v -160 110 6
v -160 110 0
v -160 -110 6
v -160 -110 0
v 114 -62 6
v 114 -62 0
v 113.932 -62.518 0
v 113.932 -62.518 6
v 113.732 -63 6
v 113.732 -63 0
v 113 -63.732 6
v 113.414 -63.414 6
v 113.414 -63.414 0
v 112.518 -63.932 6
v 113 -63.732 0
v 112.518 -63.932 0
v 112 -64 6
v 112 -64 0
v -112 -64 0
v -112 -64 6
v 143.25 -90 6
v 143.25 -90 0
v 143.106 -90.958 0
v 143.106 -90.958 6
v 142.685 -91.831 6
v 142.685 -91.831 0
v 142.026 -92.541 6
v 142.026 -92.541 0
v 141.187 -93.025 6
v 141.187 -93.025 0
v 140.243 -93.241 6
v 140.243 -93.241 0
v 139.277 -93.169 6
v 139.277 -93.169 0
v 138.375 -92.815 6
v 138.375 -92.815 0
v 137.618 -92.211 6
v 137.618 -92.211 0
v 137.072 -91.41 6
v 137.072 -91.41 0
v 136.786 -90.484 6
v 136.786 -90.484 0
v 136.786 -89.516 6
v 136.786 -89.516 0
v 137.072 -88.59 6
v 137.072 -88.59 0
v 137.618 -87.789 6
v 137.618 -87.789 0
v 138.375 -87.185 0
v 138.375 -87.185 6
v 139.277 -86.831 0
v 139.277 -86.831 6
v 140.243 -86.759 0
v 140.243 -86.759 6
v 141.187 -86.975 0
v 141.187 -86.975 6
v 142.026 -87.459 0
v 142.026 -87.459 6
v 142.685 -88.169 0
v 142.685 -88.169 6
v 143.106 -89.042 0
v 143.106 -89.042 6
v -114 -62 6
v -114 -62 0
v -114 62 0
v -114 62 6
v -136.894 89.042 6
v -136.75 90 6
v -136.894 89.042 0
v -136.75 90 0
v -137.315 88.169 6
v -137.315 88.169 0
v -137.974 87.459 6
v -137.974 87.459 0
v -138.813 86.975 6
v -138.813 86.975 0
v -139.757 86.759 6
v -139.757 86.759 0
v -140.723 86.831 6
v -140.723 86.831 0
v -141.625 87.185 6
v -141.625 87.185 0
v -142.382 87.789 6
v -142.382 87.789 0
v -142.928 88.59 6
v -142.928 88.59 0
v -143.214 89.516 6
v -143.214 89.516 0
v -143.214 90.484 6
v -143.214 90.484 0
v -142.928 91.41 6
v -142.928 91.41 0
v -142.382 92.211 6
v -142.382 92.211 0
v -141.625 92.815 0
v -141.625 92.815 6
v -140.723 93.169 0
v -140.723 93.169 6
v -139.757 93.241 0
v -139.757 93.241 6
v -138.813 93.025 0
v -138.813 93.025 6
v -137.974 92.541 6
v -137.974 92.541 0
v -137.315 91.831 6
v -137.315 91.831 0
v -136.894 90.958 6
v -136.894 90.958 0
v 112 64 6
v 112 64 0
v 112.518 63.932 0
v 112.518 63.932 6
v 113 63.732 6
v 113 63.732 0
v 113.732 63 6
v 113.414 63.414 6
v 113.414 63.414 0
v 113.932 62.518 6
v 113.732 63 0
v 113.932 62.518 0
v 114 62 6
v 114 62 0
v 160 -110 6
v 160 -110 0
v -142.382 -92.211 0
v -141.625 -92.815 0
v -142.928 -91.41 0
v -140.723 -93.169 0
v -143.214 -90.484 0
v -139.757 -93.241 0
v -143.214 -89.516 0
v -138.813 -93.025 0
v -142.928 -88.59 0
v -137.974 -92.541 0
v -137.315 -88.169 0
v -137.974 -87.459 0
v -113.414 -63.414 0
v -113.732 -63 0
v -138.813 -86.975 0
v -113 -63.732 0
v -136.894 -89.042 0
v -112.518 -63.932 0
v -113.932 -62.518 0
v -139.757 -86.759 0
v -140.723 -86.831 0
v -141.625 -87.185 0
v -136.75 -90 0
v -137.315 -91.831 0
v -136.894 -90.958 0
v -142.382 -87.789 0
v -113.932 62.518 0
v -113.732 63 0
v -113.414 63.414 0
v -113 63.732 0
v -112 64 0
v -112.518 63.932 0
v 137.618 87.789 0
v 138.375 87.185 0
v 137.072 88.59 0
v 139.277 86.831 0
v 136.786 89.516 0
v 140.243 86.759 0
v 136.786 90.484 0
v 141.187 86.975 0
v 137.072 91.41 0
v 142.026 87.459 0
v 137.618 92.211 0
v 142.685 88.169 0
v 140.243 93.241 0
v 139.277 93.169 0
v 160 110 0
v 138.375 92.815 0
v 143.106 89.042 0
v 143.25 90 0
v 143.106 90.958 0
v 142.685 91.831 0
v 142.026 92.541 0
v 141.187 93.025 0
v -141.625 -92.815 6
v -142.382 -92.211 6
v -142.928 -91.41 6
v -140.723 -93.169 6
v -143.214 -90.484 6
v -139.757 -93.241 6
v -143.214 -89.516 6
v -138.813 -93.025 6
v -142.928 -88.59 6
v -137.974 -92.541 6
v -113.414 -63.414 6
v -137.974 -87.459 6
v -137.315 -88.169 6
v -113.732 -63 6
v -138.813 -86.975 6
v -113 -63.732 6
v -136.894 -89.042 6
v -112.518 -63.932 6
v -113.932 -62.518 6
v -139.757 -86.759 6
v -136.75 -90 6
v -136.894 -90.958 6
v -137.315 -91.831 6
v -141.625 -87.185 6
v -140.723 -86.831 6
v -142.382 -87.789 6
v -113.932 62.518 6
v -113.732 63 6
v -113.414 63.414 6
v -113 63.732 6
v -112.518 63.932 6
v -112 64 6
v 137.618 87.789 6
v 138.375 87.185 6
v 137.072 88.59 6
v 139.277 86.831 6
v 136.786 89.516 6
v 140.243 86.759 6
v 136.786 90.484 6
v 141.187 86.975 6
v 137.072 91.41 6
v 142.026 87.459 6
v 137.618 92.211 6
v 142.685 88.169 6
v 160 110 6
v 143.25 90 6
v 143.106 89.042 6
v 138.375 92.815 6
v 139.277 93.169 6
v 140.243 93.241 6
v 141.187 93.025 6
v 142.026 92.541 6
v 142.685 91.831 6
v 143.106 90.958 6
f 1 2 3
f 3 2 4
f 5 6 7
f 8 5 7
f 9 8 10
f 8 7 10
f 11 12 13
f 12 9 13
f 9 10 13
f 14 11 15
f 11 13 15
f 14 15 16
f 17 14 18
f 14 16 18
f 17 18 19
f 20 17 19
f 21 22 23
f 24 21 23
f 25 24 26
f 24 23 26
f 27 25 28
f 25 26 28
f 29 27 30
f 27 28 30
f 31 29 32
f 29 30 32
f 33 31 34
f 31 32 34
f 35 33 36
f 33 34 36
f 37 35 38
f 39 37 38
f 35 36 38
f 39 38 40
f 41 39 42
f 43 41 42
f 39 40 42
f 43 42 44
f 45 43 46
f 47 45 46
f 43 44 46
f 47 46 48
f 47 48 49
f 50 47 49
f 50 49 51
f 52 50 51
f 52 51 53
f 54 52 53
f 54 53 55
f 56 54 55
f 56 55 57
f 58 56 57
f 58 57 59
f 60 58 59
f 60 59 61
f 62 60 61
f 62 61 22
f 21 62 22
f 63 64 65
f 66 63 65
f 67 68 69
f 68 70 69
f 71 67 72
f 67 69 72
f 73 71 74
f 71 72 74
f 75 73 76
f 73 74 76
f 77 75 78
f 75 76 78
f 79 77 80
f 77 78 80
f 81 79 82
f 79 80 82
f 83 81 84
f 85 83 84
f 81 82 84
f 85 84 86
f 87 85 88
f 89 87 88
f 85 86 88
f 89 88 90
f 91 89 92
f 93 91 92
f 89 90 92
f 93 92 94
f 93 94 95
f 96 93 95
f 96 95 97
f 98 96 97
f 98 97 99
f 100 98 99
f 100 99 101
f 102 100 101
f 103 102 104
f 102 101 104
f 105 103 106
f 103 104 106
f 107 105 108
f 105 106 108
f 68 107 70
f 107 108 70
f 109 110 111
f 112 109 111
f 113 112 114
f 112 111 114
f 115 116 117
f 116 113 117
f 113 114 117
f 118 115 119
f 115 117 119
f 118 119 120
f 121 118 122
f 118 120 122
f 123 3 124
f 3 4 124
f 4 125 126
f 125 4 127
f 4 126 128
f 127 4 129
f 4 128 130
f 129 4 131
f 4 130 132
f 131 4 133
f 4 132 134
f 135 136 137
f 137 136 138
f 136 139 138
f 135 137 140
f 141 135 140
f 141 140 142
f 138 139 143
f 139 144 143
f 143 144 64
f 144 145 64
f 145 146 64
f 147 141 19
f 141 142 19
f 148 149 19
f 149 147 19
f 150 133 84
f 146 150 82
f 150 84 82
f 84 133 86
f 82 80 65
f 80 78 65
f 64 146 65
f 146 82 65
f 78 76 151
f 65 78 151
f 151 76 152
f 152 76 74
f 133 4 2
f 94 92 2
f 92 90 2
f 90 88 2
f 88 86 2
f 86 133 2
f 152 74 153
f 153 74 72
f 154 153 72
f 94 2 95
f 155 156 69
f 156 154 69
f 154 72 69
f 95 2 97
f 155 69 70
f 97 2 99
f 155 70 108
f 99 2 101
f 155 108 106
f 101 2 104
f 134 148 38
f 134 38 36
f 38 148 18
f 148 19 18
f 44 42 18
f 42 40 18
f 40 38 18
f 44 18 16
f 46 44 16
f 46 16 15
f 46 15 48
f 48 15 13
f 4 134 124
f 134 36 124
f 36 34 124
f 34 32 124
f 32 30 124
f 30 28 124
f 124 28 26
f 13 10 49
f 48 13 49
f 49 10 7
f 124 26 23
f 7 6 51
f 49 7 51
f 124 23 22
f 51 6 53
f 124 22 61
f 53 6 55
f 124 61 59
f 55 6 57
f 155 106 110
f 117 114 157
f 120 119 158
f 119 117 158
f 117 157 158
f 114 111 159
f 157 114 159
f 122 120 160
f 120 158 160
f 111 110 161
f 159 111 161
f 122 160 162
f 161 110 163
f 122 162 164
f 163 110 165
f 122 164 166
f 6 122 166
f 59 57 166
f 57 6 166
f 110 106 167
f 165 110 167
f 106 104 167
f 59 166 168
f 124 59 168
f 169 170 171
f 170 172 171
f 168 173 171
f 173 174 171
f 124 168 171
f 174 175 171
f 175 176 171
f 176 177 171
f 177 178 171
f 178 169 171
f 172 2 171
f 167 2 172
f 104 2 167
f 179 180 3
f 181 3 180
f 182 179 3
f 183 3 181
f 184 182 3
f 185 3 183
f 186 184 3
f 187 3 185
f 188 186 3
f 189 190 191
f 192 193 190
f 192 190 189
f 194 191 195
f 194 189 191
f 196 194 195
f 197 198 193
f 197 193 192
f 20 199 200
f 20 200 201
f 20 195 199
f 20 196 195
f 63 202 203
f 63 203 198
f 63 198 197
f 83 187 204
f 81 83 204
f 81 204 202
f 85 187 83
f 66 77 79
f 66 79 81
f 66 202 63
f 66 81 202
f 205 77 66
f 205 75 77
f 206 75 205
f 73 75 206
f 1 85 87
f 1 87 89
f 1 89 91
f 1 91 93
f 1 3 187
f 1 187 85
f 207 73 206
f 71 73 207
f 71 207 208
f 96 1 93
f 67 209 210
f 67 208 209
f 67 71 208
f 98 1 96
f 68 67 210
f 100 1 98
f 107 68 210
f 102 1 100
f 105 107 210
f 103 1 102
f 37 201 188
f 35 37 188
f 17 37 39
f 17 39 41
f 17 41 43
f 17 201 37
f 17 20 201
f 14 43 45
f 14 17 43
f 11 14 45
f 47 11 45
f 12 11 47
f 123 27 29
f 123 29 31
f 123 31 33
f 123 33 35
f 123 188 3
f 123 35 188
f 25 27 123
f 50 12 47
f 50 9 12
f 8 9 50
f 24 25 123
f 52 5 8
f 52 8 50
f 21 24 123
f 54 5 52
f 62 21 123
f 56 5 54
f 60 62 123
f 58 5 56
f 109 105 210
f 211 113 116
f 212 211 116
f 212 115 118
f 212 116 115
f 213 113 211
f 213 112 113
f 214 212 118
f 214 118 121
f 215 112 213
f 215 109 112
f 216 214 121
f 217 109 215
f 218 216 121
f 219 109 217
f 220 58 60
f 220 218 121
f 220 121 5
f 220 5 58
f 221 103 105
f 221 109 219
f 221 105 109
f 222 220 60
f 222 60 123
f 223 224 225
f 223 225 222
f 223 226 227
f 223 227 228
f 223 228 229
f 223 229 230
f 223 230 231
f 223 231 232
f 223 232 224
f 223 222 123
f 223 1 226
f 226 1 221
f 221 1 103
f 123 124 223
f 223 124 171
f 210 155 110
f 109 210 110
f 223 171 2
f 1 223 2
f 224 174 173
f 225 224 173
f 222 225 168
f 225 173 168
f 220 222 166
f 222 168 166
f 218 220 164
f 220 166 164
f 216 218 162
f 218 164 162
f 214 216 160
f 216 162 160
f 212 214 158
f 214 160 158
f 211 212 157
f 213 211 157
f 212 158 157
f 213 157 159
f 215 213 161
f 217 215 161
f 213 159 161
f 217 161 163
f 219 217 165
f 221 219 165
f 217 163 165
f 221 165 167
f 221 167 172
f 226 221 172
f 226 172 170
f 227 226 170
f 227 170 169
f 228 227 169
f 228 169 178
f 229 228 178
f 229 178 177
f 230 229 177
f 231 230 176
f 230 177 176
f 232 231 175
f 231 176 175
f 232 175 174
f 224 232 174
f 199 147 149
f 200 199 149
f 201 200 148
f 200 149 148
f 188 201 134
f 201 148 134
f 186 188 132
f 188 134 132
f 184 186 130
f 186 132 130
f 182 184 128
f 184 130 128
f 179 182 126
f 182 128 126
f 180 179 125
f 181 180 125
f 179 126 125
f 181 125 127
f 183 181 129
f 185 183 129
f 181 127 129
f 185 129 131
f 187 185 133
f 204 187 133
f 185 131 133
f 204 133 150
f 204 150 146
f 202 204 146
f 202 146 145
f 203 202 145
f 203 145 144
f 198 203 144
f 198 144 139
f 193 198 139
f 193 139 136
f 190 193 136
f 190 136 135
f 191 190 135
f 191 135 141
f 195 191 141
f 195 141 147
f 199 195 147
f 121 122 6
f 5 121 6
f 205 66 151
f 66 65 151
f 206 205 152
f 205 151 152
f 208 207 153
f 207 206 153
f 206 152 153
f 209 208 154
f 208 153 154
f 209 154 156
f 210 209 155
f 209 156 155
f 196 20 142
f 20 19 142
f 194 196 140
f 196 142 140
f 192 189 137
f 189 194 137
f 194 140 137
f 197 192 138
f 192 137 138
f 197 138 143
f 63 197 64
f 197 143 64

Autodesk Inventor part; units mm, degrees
ref_plane "YZ Plane" through (0, 0, 0) normal (1, 0, 0) x (0, 1, 0)
ref_plane "XZ Plane" through (0, 0, 0) normal (0, 1, 0) x (-1, 0, 0)
ref_plane "XY Plane" through (0, 0, 0) normal (0, 0, 1) x (1, 0, 0)
sketch "Skizze1" plane through (0, 0, 0) normal (0, 0, 1) x (1, 0, 0)
  line L0 (112, -64) -> (-112, -64)
  line L1 (-114, -66) -> (114, -66)
  line L2 (114, -64) -> (-114, 64) construction
  line L3 (114, 64) -> (-114, -64) construction
  line L4 (115, -70) -> (-115, -70)
  line L5 (-116, 66) -> (116, -66) construction
  line L6 (-116, -66) -> (116, 66) construction
  line L7 (120, -70) -> (-120, 70) construction
  line L8 (120, 70) -> (-120, -70) construction
  line L9 (-112, 64) -> (112, 64)
  line L10 (-115, 70) -> (115, 70)
  line L11 (114, 66) -> (-114, 66)
  line L12 (-116, 64) -> (-116, -64)
  arc A0 (-116, -64) -> (-114, -66) centre (-114, -64) ccw
  line L13 (-114, -62) -> (-114, 62)
  arc A1 (-114, -62) -> (-112, -64) centre (-112, -62) ccw
  arc A2 (-120, -65) -> (-115, -70) centre (-115, -65) ccw
  line L14 (-120, -65) -> (-120, 65)
  arc A3 (-115, 70) -> (-120, 65) centre (-115, 65) ccw
  arc A4 (-114, 66) -> (-116, 64) centre (-114, 64) ccw
  arc A5 (-112, 64) -> (-114, 62) centre (-112, 62) ccw
  arc A6 (120, 65) -> (115, 70) centre (115, 65) ccw
  line L15 (120, 65) -> (120, -65)
  arc A7 (115, -70) -> (120, -65) centre (115, -65) ccw
  arc A8 (112, -64) -> (114, -62) centre (112, -62) ccw
  arc A9 (114, 62) -> (112, 64) centre (112, 62) ccw
  line L16 (114, 62) -> (114, -62)
  arc A10 (114, -66) -> (116, -64) centre (114, -64) ccw
  arc A11 (116, 64) -> (114, 66) centre (114, 64) ccw
  line L17 (116, -64) -> (116, 64)
  line L18 (-160, -110) -> (160, -110)
  line L19 (160, -110) -> (160, 110)
  line L20 (160, 110) -> (-160, 110)
  line L21 (-160, 110) -> (-160, -110)
  line L22 (-160, -110) -> (160, 110) construction
  line L23 (160, -110) -> (-160, 110) construction
  circle A12 centre (-140, -90) radius 3.25
  line L24 (140, 90) -> (-140, 90)
  line L25 (-140, 90) -> (-140, -90)
  line L26 (-140, -90) -> (140, -90)
  line L27 (140, -90) -> (140, 90)
  line L28 (140, 90) -> (-140, -90) construction
  line L29 (-140, 90) -> (140, -90) construction
  circle A13 centre (140, -90) radius 3.25
  circle A14 centre (140, 90) radius 3.25
  circle A15 centre (-140, 90) radius 3.25
  point P0 (0, 0)
  point P1 (0, 0)
  point P2 (0, 0)
  point P3 (0, 0)
  point P4 (0, 0)
  point P5 (0, 0)
  point P6 (0, 0)
  point P7 (0, 0)
  point P8 (0, 0)
  dimension "d0" = 140
  dimension "d1" = 240
  dimension "d2" = 5
  dimension "d3" = 232
  dimension "d4" = 132
  dimension "d5" = 2
  dimension "d6" = 128
  dimension "d7" = 228
  dimension "d8" = 2
  dimension "d9" = 40
  dimension "d10" = 40
  dimension "d11" = 6.5
  dimension "d12" = 20
  dimension "d13" = 20
extrude "Extrusion1" add sketch "Skizze1" along normal blind 6 contours A0 L12 A4 L11 A11 L17 A10 L1 | L4 A2 L14 A3 L10 A6 L15 A7 | L21 L20 L19 L18 | L26 L25 A12 | A12 L25 L26 | A12 L25 A15 L24 A14 L27 A13 L26 | A13 L27 L26 | L26 L27 A13 | A15 L24 L25 | L25 L24 A15 | A14 L24 L27 | L27 L24 A14
extrude "Extrusion2" cut sketch "Skizze1" along normal through all contours L26 L25 A12 | A12 L25 L26 | A13 L27 L26 | L26 L27 A13 | A15 L24 L25 | L25 L24 A15 | A14 L24 L27 | L27 L24 A14
equation "\"d14\" = mdf_thickness"
equation "\"d16\" = mdf_thickness"
equation "\"kg_thickness\" = 4.9"
equation "\"ht_thickness\" = 1.9"
equation "\"case_thickness\" = 18"
equation "\"inner_thickness\" = 15"
equation "\"gap_fit\" = 0.1"
equation "\"gap_slide\" = 0.2"
equation "\"gap_air\" = 1"
equation "\"bore_diameter\" = 73"
equation "\"mdf_thickness\" = 6"
equation "\"tape_width\" = 15"
equation "\"tape_thickness\" = 3"
equation "\"inner_depth\" = 255"
properties part number "Flachfaltenfilter_Basis"
